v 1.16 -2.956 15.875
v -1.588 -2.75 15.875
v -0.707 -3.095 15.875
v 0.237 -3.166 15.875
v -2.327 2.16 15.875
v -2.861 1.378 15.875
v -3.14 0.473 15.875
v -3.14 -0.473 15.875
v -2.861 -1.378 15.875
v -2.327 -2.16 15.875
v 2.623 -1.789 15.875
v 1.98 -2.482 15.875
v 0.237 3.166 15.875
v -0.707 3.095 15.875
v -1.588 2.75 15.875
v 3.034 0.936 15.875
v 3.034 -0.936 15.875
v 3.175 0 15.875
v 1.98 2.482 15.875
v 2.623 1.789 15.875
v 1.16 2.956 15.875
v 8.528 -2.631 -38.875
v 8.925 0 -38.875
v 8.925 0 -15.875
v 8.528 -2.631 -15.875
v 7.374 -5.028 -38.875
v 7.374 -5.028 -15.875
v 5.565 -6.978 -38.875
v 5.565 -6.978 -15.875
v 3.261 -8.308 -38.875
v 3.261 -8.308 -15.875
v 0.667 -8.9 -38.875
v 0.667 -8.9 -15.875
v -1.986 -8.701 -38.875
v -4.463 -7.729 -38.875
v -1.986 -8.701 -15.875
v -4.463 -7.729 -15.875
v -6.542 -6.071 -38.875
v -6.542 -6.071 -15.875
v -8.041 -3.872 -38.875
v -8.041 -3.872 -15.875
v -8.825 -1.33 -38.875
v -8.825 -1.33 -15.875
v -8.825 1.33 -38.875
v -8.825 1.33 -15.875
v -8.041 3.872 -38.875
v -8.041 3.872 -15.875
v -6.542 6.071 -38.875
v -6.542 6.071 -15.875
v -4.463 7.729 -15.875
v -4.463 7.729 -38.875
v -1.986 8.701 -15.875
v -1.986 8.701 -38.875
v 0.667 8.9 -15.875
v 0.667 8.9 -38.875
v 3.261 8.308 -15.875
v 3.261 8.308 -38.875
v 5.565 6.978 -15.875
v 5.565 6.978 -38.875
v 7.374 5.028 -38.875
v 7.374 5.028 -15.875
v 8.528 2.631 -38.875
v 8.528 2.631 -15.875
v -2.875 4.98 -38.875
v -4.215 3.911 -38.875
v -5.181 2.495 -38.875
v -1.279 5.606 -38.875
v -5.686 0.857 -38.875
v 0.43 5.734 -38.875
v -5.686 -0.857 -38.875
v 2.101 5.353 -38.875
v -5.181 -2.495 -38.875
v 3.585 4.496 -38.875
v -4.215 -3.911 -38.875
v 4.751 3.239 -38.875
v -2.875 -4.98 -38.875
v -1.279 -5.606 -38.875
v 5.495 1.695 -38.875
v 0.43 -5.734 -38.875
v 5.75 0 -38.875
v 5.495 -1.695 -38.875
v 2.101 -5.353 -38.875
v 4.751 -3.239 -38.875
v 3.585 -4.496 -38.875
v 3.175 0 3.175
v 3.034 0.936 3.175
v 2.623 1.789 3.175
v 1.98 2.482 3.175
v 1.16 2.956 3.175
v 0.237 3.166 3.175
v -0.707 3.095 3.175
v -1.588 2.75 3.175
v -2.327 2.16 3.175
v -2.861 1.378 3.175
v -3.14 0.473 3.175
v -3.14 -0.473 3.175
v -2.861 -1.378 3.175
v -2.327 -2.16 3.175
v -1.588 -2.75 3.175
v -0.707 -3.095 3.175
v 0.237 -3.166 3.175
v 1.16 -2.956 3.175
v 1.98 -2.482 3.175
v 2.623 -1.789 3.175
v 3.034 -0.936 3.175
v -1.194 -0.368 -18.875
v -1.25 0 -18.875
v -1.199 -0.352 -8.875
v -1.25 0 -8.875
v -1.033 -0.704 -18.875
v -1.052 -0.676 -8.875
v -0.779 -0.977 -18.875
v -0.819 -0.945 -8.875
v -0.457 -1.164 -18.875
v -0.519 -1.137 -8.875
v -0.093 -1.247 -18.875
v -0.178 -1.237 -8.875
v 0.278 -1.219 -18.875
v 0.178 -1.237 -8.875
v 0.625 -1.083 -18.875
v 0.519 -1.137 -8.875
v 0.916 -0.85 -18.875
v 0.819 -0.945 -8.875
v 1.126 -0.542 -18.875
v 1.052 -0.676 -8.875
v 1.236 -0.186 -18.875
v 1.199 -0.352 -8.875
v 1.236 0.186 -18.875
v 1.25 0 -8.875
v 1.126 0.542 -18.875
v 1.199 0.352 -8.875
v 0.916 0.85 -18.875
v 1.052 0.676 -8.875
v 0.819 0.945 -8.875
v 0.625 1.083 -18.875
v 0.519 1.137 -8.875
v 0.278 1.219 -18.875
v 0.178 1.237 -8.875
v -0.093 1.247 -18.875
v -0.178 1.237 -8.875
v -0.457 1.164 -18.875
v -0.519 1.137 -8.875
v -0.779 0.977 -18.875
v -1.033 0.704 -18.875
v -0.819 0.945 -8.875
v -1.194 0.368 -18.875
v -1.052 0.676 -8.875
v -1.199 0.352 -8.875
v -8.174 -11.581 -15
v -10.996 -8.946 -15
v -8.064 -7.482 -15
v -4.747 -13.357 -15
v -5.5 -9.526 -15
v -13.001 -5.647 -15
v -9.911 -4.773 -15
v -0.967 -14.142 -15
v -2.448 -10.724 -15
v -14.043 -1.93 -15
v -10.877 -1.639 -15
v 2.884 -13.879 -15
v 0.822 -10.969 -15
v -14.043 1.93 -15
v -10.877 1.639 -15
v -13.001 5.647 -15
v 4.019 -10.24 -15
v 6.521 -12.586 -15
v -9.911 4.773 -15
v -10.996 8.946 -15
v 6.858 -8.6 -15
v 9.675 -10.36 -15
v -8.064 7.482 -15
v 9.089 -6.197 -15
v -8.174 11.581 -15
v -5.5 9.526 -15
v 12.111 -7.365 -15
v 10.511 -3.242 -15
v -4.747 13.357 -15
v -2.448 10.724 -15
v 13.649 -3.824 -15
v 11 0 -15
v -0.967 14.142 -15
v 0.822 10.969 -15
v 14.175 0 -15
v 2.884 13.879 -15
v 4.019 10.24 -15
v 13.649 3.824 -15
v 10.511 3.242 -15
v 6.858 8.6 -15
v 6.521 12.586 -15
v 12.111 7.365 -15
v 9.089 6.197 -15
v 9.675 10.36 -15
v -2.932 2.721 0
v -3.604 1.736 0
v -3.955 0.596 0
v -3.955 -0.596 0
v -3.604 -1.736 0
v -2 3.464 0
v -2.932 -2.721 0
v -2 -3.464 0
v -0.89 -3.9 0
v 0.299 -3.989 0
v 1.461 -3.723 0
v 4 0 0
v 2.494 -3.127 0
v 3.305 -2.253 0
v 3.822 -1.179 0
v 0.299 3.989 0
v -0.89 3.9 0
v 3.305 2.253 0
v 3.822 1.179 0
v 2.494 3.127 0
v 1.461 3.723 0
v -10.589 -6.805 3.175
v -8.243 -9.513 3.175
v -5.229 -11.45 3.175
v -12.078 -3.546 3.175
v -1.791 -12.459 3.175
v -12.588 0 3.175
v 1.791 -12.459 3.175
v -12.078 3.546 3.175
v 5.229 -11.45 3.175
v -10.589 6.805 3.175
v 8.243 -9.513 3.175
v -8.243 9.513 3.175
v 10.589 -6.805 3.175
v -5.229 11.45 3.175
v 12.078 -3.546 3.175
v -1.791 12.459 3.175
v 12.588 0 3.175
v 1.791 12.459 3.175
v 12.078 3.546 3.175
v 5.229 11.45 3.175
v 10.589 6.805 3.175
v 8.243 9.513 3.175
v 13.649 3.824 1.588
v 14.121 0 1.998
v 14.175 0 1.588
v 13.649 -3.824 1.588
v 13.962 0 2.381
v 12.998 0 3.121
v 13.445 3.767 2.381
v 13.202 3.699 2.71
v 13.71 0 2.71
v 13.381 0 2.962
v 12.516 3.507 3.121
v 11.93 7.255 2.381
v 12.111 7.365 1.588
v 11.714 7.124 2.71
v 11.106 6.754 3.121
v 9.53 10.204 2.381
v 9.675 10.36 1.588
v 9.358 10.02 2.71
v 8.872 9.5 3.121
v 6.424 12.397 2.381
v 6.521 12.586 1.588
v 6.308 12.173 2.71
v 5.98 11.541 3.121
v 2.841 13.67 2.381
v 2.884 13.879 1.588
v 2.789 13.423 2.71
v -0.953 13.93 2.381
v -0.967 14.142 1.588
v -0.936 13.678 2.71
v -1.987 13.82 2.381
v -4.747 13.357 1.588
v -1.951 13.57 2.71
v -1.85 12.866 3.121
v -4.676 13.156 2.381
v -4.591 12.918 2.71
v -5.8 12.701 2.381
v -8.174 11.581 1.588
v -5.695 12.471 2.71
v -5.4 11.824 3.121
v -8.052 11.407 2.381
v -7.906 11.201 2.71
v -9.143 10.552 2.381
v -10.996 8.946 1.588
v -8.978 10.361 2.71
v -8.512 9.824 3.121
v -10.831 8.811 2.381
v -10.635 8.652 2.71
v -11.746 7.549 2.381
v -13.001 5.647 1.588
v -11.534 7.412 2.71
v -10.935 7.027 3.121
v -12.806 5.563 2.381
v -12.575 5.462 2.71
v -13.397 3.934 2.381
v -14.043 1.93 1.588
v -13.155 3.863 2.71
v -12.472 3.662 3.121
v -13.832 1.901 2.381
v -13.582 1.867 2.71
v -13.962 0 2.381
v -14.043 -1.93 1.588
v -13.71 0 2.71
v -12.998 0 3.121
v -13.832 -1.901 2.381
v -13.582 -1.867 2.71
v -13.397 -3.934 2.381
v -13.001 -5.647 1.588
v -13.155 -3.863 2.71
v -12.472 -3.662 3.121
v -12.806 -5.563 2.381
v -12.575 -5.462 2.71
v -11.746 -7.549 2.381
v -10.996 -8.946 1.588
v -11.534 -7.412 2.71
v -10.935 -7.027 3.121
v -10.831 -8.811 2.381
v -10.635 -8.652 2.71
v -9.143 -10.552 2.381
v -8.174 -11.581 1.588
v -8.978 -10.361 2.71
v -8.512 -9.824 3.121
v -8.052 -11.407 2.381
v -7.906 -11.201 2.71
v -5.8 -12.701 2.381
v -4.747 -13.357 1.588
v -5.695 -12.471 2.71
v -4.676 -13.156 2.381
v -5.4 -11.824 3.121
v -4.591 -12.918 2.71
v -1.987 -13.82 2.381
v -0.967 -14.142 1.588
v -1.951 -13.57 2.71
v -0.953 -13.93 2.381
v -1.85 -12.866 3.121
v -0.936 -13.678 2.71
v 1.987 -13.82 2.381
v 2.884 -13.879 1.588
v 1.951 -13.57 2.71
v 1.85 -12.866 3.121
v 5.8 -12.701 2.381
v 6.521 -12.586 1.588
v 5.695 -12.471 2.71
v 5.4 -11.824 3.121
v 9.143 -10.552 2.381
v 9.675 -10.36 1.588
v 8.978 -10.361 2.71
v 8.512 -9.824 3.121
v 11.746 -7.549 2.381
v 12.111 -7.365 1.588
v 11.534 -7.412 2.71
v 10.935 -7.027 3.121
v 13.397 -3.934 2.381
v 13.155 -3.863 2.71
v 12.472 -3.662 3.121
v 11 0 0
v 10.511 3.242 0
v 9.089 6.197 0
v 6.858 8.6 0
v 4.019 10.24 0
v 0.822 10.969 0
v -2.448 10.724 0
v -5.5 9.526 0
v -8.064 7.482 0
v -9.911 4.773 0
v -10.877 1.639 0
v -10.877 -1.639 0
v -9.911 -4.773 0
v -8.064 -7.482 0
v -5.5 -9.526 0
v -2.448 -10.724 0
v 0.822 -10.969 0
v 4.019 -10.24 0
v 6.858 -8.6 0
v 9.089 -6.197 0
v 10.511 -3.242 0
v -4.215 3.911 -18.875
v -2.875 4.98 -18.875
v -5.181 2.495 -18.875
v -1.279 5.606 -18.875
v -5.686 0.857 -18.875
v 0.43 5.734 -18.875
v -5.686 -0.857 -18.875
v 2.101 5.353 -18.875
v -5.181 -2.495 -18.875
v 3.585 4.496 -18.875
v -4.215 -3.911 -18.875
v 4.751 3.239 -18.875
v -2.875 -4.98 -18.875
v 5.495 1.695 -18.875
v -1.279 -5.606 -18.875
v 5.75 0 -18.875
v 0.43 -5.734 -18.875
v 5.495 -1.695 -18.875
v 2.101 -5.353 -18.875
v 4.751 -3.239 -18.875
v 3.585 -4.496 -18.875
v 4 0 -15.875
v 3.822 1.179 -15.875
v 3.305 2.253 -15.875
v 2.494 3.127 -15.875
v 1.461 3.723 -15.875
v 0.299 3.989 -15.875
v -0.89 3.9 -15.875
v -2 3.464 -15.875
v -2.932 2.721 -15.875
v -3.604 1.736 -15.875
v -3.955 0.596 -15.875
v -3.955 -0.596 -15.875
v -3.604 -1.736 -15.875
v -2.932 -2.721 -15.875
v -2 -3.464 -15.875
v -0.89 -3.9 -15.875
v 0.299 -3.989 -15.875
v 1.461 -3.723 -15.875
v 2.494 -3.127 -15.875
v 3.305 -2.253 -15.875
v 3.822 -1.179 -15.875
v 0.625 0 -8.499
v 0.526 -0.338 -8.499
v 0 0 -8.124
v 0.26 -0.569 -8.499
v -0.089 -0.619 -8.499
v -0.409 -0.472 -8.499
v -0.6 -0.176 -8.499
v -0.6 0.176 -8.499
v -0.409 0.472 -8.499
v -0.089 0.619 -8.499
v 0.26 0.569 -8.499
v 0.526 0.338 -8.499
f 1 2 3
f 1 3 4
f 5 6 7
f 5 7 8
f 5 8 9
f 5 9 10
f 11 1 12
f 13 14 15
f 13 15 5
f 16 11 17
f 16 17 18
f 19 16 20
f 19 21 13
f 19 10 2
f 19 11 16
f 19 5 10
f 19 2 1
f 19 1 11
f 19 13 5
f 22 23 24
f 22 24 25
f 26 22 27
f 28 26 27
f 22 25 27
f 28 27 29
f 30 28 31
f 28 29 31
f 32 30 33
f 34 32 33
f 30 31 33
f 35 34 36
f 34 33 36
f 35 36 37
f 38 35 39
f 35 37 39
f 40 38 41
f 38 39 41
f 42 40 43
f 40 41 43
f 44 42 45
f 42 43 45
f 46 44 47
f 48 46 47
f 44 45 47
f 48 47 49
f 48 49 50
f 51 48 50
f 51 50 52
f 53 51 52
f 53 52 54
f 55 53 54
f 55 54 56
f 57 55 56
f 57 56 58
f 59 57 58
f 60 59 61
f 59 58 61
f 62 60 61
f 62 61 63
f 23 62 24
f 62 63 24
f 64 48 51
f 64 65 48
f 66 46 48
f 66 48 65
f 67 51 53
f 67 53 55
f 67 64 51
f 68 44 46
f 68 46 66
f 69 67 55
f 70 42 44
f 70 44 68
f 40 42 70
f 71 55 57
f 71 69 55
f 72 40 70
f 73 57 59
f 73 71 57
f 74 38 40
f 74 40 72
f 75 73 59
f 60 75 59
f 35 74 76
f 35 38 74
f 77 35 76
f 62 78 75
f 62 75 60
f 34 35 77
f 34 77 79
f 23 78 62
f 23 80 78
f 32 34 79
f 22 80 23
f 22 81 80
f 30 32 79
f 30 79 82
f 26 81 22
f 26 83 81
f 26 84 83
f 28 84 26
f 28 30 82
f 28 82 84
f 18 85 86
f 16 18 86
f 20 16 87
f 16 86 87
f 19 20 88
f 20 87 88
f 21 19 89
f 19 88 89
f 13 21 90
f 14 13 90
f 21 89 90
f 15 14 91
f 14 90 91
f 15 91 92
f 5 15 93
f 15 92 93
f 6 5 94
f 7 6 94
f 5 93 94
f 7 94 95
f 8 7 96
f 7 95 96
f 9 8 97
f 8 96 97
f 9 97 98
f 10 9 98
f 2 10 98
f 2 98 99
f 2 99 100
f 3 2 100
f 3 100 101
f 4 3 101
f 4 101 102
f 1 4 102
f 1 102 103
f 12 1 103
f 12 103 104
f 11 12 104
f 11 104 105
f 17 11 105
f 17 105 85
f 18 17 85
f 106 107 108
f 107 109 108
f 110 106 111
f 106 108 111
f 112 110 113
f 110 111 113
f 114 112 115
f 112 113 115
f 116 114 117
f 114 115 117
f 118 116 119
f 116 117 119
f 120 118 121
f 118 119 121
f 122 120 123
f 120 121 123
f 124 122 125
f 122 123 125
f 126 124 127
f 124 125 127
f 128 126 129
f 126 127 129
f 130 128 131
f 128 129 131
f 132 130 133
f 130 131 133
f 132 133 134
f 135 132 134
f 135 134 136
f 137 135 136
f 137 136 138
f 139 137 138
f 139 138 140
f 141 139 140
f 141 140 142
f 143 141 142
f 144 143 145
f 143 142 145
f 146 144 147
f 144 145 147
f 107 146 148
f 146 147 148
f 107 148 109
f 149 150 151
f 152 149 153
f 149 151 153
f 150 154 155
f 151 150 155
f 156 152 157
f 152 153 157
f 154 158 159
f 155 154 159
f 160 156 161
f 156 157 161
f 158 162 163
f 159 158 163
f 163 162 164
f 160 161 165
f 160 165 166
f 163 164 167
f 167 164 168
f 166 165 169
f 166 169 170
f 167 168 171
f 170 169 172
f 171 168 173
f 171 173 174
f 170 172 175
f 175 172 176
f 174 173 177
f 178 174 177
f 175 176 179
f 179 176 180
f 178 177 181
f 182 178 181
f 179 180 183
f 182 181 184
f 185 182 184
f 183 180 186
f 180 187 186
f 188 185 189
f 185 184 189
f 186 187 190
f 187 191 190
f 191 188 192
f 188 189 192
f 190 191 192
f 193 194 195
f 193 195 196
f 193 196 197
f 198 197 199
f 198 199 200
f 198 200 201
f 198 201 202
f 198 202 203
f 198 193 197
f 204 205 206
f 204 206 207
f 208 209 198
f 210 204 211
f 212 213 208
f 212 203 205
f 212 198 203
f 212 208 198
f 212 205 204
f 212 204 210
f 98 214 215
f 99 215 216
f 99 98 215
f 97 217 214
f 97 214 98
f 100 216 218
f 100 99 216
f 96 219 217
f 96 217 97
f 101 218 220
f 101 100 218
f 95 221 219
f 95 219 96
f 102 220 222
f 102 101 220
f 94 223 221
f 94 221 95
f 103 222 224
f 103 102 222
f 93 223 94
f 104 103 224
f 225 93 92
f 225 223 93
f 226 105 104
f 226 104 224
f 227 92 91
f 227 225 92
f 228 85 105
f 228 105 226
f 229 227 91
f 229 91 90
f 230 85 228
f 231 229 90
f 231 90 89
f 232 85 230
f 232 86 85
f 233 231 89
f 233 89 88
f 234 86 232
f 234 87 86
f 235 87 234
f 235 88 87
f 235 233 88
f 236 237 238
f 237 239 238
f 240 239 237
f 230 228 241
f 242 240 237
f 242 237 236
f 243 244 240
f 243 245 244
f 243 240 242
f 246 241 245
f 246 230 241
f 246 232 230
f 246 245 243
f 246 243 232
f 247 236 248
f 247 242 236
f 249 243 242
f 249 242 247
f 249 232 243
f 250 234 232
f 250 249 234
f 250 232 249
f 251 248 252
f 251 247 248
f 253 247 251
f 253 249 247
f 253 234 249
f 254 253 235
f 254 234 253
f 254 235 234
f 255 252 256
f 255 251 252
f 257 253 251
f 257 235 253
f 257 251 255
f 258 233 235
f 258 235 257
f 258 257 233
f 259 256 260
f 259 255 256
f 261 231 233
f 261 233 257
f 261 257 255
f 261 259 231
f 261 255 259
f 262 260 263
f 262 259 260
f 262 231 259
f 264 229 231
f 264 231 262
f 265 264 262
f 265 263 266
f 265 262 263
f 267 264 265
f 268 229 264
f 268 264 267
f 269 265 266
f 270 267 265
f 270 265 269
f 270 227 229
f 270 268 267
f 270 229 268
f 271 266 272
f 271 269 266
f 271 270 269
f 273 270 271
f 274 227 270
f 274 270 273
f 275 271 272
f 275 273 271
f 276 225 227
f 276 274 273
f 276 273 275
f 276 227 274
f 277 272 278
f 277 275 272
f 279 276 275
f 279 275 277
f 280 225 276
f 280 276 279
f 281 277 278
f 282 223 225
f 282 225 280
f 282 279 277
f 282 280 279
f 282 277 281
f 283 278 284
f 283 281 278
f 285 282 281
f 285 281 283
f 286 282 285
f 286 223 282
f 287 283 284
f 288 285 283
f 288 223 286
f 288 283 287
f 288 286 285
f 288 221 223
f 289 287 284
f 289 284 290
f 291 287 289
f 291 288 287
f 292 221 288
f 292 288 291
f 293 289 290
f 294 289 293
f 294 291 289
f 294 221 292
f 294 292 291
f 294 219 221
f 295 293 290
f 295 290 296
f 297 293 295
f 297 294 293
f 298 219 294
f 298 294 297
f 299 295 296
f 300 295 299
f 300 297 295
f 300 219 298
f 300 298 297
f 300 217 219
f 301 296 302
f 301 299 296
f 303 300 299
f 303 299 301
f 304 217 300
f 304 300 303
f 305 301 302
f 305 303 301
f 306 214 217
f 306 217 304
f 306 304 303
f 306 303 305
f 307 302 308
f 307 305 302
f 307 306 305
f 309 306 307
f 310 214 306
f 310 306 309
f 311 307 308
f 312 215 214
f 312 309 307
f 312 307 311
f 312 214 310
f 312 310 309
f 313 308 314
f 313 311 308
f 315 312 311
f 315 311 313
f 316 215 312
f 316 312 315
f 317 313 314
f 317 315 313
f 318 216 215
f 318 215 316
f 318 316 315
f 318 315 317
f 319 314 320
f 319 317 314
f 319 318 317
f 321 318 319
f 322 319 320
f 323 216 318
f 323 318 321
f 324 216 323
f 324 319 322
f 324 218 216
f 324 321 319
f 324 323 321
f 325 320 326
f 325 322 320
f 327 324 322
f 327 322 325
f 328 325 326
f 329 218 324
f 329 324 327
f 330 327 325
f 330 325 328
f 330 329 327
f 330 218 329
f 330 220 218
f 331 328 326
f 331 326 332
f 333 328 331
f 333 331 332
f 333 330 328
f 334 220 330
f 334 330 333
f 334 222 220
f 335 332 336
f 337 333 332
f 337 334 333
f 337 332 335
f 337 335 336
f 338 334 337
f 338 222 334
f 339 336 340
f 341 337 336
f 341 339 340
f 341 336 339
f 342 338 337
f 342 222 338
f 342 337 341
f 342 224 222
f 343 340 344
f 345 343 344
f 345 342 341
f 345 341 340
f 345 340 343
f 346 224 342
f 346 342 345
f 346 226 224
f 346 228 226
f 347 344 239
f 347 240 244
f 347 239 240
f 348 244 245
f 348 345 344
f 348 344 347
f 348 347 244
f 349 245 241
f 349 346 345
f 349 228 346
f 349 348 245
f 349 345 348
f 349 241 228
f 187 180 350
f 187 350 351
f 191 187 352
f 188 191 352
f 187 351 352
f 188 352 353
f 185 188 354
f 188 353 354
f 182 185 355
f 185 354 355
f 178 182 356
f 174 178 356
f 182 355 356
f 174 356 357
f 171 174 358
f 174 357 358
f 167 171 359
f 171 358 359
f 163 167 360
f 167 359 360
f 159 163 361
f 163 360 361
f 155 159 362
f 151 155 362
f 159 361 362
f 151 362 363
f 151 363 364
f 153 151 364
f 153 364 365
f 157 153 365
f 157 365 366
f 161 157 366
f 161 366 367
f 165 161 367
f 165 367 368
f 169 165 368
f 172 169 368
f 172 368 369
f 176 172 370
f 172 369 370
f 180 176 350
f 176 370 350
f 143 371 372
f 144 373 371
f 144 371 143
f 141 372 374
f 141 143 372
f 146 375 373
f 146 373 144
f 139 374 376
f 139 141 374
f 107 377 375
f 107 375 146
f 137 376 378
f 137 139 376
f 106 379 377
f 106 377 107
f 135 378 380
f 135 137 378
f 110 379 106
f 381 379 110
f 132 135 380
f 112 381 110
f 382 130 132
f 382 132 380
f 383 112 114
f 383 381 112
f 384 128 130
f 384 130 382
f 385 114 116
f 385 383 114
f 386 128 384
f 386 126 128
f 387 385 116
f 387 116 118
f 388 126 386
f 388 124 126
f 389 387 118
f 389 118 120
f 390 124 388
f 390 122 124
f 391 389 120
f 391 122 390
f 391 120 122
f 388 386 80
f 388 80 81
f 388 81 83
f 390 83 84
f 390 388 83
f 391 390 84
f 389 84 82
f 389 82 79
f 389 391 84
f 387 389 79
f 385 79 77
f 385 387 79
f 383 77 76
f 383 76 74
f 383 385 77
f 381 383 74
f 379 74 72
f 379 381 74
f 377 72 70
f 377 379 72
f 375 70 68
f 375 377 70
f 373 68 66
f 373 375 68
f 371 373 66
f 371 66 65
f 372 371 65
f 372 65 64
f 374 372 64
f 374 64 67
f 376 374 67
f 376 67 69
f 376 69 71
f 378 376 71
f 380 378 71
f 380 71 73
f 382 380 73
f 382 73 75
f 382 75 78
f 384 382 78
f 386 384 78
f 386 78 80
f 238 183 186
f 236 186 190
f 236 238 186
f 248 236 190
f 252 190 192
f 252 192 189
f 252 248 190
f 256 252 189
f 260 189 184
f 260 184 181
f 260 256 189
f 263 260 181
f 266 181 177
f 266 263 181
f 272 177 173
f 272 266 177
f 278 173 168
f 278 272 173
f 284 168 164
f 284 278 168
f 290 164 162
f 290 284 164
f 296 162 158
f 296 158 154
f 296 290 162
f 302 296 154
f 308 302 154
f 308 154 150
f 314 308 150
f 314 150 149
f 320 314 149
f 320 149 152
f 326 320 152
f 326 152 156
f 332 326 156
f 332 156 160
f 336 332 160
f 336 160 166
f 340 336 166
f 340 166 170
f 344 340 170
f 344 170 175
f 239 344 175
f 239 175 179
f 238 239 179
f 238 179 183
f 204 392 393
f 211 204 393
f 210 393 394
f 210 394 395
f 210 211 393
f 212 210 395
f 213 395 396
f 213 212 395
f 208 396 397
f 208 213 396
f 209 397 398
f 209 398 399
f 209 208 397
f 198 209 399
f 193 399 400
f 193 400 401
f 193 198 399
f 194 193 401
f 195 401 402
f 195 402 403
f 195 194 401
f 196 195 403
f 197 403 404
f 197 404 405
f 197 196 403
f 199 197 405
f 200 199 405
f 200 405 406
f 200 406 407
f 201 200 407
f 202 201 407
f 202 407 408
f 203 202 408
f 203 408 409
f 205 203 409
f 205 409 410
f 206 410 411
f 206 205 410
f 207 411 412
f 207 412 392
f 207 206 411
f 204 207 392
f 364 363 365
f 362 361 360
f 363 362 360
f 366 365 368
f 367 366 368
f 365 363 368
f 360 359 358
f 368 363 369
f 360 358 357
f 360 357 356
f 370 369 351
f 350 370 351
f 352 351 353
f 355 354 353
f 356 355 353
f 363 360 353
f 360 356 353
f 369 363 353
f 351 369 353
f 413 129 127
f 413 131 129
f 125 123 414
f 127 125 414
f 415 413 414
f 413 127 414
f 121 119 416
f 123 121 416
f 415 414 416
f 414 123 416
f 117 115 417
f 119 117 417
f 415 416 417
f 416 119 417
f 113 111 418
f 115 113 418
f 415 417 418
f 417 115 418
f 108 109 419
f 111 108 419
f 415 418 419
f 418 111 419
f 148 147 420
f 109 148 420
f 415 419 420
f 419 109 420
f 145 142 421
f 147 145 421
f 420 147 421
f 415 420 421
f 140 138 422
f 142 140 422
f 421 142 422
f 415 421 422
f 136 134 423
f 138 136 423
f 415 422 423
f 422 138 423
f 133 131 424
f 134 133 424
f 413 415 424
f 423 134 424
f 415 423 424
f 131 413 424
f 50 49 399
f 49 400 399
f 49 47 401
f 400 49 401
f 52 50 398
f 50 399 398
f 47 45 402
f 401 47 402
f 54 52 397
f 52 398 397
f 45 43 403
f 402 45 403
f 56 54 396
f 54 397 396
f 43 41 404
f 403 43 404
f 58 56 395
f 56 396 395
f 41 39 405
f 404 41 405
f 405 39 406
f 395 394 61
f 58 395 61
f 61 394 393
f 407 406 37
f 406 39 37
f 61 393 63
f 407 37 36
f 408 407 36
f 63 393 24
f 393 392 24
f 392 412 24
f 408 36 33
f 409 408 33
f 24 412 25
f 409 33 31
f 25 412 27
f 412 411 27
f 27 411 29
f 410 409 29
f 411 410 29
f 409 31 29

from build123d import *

# Parameters (mm, degrees)
F0_R      = 3.175
F1_DEPTH  = 15.875
F0_R_2    = 14.175
F0_R_3    = 11
F0_R_4    = 4
F2_DEPTH  = 3.175
F3_DEPTH  = 15
F4_R      = 1.5875
F5_R      = 4
F6_DEPTH  = 15.875
F7_R      = 8.925
F7_R_2    = 5.75
F8_DEPTH  = 23
F7_R_3    = 4
F9_DEPTH  = 3
F11_D     = 2.5
F11_DEPTH = 10
F11_TIP   = 0.7510757738


with BuildPart() as f1:
    # F0 (on Top) → F1 (new body)
    with BuildSketch(Plane.XY):
        Circle(F0_R)
    extrude(amount=F1_DEPTH)

    # F0 (on Top) → F2 (join)
    with BuildSketch(Plane.XY):
        Circle(F0_R_2)
        Circle(F0_R_3, mode=Mode.SUBTRACT)
        Circle(F0_R_3)
        Circle(F0_R_4, mode=Mode.SUBTRACT)
        Circle(F0_R_4)
        Circle(F0_R, mode=Mode.SUBTRACT)
    extrude(amount=F2_DEPTH)

    # F0 (on Top) → F3 (join)
    with BuildSketch(Plane.XY):
        Circle(F0_R_2)
        Circle(F0_R_3, mode=Mode.SUBTRACT)
    extrude(amount=-F3_DEPTH)

    # F4
    f4_edges = [f1.edges().sort_by_distance(p)[0] for p in [
        (-14.175, 0, 3.175),
    ]]
    fillet(f4_edges, radius=F4_R)


with BuildPart() as f6:
    # F5 (on face) → F6 (new body)
    with BuildSketch(Plane.XY):
        Circle(F5_R)
    extrude(amount=-F6_DEPTH)



with BuildPart() as f8:
    # F7 (on face) → F8 (new body)
    with BuildSketch(Plane(origin=(0, 0, -15.875), x_dir=(1, 0, 0), z_dir=(0, 0, -1))):
        Circle(F7_R)
        Circle(F7_R_2, mode=Mode.SUBTRACT)
    extrude(amount=F8_DEPTH)


with BuildPart() as f6_1:
    add(f6.part)

    add(f8.part)  # F9 merges F8
    # F7 (on face) → F9 (join)
    with BuildSketch(Plane(origin=(0, 0, -15.875), x_dir=(1, 0, 0), z_dir=(0, 0, -1))):
        Circle(F7_R_2)
        Circle(F7_R_3, mode=Mode.SUBTRACT)
        Circle(F7_R_3)
    extrude(amount=F9_DEPTH)

    # F11
    with Locations(Plane(origin=(0, 0, -18.875), x_dir=(1, 0, 0), z_dir=(0, 0, -1))):
        with Locations((0, 0)):
            Hole(F11_D / 2, depth=F11_DEPTH)
            with Locations((0, 0, -(F11_DEPTH + F11_TIP / 2))):  # 118° drill point
                Cone(0, F11_D / 2, F11_TIP, mode=Mode.SUBTRACT)


solid = Compound([f1.part, f6_1.part])
